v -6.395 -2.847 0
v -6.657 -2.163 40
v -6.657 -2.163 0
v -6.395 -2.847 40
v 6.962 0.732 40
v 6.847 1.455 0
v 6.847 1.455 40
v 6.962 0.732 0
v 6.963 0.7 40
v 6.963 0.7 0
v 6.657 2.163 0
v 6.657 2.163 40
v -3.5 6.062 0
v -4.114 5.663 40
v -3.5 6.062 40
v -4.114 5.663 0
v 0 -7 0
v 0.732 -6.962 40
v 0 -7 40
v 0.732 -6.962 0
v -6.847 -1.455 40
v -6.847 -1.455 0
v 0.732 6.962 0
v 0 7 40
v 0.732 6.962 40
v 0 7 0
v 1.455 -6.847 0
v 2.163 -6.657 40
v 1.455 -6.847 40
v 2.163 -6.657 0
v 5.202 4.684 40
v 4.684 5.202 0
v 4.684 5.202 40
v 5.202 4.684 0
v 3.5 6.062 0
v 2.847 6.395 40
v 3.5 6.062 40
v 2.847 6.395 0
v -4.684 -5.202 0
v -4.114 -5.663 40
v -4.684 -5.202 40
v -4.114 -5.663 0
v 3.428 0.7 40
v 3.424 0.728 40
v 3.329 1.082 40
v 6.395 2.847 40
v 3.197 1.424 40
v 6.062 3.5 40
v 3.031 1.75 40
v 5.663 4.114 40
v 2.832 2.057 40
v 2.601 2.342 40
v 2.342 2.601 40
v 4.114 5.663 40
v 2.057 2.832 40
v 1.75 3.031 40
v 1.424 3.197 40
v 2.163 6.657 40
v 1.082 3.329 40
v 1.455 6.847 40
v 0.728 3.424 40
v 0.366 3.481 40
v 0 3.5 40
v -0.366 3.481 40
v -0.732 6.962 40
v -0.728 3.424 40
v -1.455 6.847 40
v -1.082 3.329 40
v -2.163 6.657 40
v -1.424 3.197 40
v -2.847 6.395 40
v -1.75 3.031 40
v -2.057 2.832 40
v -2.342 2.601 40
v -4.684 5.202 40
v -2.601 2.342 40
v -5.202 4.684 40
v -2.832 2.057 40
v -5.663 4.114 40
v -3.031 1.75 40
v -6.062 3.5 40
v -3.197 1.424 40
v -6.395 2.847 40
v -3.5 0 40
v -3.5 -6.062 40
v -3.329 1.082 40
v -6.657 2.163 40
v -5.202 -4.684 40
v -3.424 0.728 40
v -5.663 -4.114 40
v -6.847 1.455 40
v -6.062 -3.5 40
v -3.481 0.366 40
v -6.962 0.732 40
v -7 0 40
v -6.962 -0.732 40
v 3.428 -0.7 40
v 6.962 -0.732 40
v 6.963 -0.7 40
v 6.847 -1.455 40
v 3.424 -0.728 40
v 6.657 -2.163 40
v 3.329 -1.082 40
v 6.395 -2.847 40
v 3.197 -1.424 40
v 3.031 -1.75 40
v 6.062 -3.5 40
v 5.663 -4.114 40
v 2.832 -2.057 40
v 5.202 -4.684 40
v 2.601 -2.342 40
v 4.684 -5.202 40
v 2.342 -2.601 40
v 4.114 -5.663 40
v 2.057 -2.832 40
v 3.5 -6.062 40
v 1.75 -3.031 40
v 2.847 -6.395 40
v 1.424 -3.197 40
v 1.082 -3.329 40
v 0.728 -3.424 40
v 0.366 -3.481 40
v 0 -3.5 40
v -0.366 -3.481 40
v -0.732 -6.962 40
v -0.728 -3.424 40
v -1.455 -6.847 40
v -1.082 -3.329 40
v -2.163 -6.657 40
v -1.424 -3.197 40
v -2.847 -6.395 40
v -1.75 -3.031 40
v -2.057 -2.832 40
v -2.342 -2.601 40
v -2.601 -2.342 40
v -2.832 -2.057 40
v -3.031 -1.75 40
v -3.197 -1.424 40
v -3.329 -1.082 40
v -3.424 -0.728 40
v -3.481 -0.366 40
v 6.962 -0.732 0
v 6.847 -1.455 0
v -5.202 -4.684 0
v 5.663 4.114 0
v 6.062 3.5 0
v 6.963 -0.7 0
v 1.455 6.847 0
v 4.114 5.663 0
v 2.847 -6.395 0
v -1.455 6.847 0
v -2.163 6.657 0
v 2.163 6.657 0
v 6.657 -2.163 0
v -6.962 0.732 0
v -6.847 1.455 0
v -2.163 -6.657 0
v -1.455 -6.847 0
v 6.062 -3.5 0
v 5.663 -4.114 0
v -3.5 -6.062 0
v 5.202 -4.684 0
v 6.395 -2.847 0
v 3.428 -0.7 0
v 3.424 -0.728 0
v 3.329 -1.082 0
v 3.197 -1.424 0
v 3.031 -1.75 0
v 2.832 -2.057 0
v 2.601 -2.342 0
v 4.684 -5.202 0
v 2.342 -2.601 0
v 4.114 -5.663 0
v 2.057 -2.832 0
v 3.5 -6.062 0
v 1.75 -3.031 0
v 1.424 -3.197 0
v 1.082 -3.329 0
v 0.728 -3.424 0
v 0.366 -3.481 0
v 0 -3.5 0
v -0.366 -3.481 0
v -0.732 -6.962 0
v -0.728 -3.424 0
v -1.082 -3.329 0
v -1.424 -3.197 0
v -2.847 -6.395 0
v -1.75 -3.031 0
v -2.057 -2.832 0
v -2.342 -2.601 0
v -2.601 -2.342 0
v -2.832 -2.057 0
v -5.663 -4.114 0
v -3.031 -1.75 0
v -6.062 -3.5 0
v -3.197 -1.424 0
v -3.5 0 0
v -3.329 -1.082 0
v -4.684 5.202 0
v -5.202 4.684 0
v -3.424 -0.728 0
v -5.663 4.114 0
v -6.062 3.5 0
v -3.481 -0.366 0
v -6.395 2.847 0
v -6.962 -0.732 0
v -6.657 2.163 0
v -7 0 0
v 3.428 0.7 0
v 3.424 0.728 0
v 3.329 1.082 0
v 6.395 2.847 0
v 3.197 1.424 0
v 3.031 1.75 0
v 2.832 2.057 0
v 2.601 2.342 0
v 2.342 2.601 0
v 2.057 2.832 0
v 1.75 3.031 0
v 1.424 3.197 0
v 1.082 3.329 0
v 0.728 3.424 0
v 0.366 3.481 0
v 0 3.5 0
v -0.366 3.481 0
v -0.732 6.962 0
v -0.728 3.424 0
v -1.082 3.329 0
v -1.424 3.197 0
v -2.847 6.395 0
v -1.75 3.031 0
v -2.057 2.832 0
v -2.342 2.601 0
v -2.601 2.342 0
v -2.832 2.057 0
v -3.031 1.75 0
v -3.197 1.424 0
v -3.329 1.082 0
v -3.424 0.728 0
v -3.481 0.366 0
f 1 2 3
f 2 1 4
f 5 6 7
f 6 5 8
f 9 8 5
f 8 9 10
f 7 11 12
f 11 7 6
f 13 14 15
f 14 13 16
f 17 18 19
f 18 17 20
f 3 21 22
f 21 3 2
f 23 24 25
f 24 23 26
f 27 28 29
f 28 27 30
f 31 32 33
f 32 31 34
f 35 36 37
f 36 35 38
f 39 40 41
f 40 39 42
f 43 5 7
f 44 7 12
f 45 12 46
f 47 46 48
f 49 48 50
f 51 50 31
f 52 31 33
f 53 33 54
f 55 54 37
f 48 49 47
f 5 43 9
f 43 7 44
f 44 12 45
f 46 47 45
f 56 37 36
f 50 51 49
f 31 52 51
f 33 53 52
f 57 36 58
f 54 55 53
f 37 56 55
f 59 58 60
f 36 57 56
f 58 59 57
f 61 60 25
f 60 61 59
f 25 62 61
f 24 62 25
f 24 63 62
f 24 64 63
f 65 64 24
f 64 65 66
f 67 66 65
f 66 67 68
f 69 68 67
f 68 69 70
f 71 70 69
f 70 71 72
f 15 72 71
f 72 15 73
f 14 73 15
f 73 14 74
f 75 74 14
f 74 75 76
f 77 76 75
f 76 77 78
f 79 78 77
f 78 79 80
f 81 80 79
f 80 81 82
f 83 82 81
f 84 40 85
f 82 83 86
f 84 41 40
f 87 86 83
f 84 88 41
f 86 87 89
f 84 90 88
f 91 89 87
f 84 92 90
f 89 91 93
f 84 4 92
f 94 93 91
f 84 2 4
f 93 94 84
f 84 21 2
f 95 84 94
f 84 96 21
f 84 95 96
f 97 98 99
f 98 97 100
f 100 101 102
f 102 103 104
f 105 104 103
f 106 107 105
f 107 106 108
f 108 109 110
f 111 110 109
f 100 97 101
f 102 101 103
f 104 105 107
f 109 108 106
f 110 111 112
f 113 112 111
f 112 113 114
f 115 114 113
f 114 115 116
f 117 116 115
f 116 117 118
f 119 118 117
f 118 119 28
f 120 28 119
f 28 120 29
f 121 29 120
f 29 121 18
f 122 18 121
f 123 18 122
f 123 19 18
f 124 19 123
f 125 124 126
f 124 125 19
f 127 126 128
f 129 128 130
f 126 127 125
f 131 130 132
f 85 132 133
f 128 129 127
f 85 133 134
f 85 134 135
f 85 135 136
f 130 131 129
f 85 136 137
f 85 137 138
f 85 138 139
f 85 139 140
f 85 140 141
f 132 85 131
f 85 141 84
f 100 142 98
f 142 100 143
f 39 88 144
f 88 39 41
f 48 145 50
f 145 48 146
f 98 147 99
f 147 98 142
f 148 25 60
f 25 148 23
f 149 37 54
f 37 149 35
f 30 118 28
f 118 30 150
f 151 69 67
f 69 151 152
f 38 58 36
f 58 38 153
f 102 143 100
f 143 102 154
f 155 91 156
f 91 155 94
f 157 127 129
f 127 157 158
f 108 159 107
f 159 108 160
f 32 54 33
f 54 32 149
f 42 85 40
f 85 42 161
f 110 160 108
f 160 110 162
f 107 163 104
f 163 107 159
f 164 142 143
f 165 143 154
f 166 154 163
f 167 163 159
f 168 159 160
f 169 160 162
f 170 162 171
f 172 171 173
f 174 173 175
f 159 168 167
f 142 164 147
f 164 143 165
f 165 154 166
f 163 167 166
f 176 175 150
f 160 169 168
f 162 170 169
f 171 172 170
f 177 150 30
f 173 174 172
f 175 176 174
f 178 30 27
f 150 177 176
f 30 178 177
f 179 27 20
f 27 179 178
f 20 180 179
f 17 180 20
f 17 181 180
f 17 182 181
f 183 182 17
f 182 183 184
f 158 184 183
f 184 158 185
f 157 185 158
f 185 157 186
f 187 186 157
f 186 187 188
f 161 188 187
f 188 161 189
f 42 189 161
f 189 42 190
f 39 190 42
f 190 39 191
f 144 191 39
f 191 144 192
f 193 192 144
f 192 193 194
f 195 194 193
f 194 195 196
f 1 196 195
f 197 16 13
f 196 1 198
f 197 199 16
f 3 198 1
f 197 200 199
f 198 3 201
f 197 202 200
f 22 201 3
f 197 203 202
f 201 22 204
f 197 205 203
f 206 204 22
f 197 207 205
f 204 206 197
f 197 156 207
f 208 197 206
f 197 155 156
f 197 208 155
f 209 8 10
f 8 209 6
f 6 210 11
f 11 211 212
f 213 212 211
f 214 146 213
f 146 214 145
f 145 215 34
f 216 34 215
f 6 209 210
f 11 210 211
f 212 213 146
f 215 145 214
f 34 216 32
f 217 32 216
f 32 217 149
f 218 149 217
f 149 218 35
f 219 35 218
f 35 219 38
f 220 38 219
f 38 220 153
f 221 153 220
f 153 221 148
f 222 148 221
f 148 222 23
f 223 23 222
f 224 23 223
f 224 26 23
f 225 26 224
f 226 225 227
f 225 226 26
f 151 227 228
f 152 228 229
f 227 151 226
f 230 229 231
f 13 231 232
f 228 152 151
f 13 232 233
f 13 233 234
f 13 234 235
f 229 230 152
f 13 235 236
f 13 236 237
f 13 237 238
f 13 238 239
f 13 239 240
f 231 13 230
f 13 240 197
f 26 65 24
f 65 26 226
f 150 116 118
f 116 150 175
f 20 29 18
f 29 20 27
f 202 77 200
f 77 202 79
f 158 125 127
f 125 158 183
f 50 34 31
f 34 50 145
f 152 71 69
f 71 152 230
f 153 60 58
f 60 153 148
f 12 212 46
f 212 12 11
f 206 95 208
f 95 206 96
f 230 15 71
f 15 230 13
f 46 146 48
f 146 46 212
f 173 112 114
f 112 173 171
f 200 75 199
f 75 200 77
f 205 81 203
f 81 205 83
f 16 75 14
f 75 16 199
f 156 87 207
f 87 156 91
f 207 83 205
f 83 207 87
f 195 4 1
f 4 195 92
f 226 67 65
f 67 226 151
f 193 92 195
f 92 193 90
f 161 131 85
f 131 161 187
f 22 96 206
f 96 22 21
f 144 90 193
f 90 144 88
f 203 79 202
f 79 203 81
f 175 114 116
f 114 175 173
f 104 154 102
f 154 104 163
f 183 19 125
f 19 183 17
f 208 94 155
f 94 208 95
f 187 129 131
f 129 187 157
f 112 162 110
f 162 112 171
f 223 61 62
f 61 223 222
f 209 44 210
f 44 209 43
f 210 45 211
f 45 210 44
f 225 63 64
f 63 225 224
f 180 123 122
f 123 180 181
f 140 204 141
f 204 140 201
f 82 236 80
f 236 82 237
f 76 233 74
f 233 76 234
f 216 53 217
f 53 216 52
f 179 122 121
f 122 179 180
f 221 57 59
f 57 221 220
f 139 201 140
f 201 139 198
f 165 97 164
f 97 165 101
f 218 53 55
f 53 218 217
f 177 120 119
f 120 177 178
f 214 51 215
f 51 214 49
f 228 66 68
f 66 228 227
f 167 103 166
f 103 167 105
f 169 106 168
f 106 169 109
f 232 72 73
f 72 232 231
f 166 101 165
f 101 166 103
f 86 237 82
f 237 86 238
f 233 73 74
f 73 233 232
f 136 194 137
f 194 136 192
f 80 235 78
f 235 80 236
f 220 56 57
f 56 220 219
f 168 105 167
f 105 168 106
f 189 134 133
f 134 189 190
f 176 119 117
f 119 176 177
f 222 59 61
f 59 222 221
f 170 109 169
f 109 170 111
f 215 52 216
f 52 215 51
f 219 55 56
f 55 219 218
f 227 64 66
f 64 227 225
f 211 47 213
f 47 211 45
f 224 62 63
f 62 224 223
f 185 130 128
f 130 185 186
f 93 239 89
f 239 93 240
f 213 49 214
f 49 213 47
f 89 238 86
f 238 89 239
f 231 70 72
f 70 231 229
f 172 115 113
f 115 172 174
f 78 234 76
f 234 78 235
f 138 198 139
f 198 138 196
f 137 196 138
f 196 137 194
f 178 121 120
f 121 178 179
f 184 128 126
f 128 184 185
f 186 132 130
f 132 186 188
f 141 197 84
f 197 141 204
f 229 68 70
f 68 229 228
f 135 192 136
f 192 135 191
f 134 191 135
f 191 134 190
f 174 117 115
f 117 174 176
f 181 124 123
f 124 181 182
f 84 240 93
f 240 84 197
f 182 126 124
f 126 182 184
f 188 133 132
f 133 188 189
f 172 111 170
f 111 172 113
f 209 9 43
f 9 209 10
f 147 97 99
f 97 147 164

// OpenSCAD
// Slotted roll pin.
$fn = 60;
eps = 0.02;
inner_d = 7;
outer_d = 14;
length = 40;
slot = 1.4;
difference() {
    cylinder(d=outer_d,h=length);
    translate([0,0,-eps]) cylinder(d=inner_d,h=length+2*eps);
    translate([0,-slot/2,-eps]) cube([outer_d/2+eps,slot,length+2*eps]);
}
